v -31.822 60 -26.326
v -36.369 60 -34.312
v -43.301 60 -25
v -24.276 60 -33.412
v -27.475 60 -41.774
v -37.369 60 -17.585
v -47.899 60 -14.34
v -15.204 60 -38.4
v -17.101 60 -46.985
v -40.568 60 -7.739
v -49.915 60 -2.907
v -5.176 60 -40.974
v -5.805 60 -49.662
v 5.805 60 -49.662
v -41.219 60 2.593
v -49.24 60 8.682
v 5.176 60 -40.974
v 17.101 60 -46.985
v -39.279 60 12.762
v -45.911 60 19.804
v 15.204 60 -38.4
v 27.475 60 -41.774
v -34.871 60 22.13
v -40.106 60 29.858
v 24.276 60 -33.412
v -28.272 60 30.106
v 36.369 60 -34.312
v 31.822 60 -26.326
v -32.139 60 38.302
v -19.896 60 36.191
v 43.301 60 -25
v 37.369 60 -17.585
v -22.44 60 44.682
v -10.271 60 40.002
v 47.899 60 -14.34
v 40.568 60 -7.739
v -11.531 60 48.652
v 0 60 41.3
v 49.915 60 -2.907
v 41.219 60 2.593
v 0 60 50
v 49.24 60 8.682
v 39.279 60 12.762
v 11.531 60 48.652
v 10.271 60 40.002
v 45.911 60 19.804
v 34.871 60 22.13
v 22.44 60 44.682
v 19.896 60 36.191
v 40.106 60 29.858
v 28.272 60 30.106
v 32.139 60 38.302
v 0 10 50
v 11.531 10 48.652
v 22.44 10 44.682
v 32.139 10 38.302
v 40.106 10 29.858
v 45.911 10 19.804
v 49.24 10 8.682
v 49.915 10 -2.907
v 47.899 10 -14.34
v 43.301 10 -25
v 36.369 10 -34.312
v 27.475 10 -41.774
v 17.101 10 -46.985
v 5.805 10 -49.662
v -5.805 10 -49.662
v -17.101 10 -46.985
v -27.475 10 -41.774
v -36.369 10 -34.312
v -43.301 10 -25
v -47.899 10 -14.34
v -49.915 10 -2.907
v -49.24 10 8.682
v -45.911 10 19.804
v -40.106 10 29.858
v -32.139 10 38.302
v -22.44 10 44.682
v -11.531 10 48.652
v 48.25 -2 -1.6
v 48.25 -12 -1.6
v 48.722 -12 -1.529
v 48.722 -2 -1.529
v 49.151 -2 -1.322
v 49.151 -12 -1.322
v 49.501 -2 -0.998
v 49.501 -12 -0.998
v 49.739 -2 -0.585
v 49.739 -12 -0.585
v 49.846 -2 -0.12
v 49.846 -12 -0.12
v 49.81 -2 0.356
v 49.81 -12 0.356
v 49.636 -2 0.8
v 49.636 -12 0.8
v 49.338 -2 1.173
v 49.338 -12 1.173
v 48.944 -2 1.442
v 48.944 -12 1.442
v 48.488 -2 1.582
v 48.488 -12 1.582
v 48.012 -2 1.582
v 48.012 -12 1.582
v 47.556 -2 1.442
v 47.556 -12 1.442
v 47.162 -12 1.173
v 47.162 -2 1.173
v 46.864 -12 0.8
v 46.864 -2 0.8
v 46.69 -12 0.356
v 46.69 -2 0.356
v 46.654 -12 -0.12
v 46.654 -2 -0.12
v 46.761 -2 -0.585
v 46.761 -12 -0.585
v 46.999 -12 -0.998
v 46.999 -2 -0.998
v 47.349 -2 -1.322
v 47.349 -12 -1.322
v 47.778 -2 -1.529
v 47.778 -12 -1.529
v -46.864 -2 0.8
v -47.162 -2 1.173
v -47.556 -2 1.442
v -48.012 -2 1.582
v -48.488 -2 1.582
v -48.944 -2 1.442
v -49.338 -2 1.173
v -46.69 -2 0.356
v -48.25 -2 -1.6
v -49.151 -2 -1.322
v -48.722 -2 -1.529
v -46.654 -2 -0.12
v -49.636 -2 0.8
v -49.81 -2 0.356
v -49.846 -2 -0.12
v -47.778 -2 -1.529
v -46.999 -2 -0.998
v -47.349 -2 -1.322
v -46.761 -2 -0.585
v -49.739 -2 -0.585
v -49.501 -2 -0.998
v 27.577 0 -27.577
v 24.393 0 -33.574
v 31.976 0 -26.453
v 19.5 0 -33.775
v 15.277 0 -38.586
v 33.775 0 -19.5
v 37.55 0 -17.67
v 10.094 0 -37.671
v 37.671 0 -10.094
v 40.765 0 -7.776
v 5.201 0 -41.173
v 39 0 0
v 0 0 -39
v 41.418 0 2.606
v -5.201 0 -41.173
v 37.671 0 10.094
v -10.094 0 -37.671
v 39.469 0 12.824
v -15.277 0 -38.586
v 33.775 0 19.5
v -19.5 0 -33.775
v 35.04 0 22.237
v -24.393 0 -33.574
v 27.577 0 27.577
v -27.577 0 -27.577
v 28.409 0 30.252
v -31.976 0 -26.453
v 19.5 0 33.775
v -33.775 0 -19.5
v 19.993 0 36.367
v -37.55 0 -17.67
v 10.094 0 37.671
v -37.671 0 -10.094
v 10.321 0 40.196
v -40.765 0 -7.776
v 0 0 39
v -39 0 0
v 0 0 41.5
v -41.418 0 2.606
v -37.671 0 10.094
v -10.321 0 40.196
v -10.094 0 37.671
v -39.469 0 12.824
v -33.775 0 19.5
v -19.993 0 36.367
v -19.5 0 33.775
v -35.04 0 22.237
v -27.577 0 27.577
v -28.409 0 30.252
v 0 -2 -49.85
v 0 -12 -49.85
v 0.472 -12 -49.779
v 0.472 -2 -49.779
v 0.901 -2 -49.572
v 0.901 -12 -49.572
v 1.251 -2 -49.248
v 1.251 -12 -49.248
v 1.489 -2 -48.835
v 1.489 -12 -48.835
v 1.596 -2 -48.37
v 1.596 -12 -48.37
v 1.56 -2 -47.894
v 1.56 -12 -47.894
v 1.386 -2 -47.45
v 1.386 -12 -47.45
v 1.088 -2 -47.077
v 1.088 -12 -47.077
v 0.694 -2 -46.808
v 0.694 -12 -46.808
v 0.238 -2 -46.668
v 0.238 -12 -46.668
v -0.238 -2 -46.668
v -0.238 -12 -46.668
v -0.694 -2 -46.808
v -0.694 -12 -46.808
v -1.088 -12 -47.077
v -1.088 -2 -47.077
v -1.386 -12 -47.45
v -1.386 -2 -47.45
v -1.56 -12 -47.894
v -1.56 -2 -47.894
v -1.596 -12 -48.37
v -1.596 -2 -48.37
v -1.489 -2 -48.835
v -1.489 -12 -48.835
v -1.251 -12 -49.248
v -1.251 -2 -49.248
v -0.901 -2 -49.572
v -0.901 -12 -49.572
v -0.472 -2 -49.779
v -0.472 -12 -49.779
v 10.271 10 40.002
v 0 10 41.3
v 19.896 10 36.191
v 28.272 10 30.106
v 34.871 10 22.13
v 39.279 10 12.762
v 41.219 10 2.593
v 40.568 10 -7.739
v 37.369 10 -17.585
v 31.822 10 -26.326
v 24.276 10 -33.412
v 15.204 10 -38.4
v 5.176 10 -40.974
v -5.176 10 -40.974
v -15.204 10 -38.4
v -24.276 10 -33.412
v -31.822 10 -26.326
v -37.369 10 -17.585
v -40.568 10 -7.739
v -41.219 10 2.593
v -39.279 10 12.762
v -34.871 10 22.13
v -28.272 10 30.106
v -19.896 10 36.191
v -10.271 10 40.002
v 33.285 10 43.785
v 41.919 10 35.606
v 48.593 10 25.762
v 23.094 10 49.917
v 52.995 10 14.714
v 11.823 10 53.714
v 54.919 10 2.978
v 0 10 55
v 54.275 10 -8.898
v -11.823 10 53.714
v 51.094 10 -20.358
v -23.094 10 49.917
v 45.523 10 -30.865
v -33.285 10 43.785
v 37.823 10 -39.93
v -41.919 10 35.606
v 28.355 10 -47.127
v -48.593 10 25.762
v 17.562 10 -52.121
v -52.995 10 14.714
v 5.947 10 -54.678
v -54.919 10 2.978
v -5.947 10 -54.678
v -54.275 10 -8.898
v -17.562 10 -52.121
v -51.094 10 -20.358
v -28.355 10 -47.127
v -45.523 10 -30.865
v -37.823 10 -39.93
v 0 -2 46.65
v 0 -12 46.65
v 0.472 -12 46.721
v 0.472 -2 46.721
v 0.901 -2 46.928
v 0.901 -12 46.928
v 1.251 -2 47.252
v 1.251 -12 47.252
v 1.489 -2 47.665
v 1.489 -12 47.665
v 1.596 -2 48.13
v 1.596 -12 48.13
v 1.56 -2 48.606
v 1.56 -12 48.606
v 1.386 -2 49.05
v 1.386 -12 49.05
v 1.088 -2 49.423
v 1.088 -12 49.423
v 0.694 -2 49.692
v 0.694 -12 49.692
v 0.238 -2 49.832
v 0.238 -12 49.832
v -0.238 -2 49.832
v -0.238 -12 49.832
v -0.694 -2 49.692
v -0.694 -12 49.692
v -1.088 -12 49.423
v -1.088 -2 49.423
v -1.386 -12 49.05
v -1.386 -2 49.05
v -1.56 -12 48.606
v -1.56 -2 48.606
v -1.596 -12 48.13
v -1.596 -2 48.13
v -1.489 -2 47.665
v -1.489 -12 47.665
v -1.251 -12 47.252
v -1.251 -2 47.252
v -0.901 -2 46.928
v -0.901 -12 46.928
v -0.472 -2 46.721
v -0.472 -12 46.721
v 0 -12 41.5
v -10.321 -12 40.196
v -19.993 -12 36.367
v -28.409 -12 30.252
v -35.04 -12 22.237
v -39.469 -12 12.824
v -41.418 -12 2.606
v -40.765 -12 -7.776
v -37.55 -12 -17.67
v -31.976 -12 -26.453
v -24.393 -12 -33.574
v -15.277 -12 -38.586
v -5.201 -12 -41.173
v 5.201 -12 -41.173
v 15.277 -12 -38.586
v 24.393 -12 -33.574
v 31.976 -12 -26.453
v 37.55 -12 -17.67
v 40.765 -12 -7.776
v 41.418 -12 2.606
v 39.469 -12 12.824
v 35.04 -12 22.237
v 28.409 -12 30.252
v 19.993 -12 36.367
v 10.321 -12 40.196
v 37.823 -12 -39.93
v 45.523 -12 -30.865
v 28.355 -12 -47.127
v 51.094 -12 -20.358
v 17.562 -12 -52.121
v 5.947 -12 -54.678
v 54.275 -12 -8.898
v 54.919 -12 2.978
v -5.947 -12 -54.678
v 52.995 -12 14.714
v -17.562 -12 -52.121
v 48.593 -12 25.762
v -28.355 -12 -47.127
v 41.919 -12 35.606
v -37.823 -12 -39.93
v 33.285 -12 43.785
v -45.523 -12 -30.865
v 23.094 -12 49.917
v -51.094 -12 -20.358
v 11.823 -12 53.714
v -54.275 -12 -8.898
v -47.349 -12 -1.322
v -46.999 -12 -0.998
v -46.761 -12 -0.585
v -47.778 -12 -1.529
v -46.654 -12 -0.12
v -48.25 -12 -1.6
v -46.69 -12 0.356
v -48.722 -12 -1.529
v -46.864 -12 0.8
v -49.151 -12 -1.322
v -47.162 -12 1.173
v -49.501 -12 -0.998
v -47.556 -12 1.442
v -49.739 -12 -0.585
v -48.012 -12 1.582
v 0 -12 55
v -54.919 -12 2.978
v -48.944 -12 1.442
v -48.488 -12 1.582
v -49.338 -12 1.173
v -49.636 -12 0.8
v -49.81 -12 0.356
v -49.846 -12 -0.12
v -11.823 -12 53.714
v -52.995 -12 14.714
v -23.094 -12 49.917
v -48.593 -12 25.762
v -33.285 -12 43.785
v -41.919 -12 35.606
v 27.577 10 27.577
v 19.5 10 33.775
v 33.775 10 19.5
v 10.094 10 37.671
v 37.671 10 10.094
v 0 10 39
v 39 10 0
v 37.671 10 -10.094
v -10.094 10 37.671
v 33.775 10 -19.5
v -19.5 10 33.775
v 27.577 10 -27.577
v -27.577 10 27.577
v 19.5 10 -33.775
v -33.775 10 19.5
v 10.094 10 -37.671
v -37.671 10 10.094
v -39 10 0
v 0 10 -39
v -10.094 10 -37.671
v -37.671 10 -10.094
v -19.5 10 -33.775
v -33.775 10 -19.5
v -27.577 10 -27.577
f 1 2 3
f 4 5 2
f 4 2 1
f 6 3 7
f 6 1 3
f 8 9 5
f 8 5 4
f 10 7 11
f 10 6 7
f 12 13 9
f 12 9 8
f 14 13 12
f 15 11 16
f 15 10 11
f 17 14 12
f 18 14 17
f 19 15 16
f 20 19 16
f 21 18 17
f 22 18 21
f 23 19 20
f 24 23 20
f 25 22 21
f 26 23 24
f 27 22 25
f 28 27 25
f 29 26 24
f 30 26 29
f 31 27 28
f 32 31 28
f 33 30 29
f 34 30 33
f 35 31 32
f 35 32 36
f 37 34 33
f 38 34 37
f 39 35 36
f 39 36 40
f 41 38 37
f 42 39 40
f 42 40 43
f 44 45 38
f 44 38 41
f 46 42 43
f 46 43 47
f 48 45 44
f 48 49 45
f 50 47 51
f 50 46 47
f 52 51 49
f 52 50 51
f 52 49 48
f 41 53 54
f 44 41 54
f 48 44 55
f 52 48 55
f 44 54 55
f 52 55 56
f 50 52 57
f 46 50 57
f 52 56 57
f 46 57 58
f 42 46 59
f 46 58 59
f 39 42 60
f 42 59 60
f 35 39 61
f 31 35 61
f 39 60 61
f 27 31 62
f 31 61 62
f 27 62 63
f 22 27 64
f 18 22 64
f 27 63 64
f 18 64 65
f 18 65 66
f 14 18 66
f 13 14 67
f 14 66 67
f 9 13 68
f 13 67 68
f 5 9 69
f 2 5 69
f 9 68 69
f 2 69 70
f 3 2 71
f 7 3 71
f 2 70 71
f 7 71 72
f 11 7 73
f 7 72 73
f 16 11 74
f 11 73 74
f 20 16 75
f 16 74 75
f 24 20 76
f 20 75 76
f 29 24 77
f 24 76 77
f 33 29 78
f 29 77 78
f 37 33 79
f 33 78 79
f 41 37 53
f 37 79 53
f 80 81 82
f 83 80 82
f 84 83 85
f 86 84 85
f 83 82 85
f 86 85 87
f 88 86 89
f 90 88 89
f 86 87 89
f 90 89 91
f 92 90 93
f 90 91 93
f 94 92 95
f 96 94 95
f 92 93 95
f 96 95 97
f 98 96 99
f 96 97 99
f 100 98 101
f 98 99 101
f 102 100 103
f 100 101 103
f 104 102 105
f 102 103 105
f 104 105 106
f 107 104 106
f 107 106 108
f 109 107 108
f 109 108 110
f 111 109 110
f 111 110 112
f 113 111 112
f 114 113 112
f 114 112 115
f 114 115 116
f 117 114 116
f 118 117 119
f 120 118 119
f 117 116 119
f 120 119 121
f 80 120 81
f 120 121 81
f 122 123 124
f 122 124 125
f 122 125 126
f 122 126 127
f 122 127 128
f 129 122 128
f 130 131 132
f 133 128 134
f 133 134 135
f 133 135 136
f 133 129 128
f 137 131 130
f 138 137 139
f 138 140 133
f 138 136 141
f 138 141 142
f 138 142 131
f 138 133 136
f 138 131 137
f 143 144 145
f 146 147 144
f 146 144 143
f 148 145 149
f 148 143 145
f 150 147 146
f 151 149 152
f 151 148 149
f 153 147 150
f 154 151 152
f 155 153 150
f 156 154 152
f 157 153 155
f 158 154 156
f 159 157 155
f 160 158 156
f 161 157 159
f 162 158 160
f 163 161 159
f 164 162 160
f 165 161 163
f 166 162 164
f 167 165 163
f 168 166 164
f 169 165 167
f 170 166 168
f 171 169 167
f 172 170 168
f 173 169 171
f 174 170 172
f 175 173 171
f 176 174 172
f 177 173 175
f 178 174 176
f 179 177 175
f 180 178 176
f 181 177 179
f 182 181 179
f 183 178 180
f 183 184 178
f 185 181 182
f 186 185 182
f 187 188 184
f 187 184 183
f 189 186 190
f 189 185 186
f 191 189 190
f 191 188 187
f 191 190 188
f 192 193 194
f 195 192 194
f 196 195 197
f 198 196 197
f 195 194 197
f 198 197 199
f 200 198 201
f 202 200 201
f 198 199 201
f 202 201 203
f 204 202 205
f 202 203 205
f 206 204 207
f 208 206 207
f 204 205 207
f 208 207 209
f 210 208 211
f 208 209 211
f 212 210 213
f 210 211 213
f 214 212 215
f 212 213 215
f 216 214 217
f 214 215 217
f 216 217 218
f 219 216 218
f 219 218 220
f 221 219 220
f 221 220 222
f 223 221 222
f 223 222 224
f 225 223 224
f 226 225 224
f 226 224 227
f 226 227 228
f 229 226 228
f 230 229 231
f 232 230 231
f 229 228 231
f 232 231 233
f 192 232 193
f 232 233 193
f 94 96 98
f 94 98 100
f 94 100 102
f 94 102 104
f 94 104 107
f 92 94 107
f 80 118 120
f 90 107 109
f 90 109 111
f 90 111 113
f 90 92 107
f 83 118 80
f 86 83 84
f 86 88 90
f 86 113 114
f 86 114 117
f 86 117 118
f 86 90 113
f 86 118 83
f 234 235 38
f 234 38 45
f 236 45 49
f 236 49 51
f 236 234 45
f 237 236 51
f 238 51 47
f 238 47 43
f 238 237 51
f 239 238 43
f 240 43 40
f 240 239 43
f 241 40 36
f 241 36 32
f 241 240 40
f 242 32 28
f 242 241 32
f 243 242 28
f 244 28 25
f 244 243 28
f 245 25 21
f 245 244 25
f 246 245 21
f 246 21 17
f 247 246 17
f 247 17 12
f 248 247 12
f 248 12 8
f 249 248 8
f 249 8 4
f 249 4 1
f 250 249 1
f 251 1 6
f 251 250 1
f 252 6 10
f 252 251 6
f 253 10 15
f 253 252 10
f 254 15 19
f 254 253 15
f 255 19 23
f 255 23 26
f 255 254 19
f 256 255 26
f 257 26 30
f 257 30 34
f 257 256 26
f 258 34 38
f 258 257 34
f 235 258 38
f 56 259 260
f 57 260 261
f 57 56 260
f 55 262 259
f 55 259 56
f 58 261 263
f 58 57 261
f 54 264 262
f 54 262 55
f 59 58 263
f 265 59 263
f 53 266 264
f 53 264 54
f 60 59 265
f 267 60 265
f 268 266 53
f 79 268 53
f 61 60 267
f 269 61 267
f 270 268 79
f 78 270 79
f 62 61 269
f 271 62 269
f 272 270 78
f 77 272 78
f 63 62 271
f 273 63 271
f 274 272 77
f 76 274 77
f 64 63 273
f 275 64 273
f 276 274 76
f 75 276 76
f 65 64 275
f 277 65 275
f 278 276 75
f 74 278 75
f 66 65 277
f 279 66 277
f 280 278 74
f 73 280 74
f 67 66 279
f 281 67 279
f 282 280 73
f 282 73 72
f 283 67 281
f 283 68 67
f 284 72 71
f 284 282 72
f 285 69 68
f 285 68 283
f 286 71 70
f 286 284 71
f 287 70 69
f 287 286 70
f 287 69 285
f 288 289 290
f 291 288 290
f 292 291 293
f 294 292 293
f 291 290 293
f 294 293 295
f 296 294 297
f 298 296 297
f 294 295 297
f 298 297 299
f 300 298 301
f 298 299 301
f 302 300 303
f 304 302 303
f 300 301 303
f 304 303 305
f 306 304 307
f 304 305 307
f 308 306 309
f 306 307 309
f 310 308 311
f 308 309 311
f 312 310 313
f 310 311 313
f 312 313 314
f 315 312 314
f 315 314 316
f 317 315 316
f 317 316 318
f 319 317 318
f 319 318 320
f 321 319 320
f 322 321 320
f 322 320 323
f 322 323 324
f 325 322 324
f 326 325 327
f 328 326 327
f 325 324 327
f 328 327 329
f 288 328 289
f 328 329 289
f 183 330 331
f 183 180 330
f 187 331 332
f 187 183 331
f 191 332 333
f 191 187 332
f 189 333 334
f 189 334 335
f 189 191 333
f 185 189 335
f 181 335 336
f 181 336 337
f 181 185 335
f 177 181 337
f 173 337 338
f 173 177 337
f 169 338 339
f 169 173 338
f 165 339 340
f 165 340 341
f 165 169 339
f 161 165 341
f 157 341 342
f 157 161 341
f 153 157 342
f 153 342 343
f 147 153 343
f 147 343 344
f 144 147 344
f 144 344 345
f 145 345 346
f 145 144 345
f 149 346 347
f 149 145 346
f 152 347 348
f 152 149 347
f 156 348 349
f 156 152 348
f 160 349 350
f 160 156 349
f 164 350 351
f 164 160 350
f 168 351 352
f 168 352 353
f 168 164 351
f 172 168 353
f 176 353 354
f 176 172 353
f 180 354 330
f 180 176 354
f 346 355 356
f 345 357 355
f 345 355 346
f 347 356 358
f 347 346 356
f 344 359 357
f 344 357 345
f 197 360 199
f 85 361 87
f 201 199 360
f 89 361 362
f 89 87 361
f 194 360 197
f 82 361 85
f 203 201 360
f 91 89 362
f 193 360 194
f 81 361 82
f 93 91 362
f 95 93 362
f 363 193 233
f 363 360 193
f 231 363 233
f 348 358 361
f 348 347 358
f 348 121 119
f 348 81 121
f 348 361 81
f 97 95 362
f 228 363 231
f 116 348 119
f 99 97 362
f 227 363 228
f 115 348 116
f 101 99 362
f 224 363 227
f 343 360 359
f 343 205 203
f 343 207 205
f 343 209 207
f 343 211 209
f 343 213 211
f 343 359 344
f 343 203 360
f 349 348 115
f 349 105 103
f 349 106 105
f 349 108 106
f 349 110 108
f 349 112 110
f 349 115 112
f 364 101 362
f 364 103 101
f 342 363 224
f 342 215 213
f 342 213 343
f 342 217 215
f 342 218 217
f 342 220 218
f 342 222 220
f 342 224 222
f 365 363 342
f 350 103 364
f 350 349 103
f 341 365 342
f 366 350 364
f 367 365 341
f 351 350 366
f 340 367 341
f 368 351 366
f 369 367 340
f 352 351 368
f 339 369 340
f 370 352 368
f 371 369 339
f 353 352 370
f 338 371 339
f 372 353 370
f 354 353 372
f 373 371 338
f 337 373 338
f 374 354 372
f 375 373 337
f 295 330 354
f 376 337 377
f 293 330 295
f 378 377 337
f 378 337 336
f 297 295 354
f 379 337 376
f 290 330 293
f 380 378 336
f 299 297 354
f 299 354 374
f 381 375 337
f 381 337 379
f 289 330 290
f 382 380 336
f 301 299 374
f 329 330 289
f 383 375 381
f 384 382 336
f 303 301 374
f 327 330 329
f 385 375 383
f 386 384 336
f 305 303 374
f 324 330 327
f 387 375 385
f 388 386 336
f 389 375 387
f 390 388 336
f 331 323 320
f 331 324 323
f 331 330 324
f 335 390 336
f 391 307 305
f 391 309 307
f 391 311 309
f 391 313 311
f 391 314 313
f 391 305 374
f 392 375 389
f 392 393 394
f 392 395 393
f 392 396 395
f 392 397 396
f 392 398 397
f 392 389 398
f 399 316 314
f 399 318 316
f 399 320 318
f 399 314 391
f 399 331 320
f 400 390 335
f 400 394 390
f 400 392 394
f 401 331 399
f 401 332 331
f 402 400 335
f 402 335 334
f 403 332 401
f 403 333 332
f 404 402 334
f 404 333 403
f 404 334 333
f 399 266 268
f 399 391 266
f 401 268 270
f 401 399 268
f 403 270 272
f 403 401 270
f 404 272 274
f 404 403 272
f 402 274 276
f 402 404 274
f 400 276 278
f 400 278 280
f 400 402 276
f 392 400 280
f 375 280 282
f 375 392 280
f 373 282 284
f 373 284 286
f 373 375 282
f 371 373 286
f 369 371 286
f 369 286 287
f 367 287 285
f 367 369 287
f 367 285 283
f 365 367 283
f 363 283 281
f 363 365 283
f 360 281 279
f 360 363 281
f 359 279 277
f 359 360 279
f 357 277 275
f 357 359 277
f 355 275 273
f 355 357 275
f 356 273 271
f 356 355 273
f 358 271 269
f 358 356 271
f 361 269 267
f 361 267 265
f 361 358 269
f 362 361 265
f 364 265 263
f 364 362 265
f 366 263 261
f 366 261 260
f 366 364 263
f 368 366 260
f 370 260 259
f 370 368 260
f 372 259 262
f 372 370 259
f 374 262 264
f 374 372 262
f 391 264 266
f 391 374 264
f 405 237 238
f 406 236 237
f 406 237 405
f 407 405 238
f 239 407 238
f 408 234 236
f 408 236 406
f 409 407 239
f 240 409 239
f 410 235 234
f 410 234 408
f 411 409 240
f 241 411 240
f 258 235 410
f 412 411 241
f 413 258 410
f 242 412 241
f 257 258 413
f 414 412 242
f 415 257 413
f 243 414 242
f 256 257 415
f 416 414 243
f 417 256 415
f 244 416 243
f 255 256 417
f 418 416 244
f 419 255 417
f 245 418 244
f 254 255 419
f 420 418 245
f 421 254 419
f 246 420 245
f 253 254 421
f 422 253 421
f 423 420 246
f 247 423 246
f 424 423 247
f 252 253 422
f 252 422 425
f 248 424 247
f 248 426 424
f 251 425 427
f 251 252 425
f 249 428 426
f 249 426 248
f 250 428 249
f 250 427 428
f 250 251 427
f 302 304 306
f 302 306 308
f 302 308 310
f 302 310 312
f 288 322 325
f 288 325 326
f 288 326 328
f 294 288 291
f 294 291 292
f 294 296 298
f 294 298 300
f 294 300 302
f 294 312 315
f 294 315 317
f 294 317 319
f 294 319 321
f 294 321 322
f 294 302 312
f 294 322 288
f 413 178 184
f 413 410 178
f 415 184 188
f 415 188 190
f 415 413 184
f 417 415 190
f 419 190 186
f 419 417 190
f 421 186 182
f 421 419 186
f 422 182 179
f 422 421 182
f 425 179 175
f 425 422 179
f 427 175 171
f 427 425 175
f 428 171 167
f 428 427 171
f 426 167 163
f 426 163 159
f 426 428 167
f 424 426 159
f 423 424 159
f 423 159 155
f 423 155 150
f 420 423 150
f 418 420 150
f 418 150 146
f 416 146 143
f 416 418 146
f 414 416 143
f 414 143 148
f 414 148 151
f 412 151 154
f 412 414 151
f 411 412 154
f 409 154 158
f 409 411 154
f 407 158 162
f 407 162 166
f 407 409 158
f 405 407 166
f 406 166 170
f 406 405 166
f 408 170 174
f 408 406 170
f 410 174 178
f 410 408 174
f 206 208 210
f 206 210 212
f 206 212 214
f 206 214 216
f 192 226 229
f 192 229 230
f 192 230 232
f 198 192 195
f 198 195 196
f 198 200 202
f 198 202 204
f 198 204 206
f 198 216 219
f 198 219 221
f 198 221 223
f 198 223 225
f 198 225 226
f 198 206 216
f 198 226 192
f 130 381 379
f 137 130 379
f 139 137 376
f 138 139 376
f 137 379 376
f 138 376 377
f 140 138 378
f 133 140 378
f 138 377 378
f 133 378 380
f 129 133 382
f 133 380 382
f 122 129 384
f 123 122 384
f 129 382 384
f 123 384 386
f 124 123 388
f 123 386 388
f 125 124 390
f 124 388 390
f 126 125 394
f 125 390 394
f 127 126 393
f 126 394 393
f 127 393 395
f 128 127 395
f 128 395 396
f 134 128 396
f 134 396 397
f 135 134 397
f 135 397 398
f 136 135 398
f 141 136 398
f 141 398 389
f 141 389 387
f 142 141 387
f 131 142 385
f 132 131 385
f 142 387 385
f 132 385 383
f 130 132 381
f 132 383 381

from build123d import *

# Parameters (mm, degrees)
SKETCH4_R           = 50
SKETCH4_R_2         = 41.3
BOSS_EXTRUDE1_DEPTH = 50
SKETCH3_R           = 1.6
CUT_EXTRUDE1_DEPTH  = 10


with BuildPart() as part:
    # Sketch1 → Revolve1 (revolve)
    with BuildSketch(Plane.XY, mode=Mode.PRIVATE) as revolve1_sk:
        Polygon((39, 0), (39, 10), (55, 10), (55, -12), (41.5, -12), (41.5, 0), align=None)
    revolve(revolve1_sk.sketch.rotate(Axis((0, 83.520836207, 0), (0, -1, 0)), 90), axis=Axis((0, 83.520836207, 0), (0, -1, 0)))

    # Sketch4 → Boss-Extrude1 (add)
    with BuildSketch(Plane(origin=(0, 10, 0), x_dir=(1, 0, 0), z_dir=(0, 1, 0))):
        with Locations(Location((0, 0, 0), (0, 0, 270))):
            Circle(SKETCH4_R)
        with Locations(Location((0, 0, 0), (0, 0, 270))):
            Circle(SKETCH4_R_2, mode=Mode.SUBTRACT)
    extrude(amount=BOSS_EXTRUDE1_DEPTH)

    # Sketch3 → Cut-Extrude1 (cut)
    with BuildSketch(Plane.XZ.offset(12)):
        with Locations(Location((0, 48.25, 0), (0, 0, 270))):
            Circle(SKETCH3_R)
        with Locations(Location((48.25, 0, 0), (0, 0, 270))):
            Circle(SKETCH3_R)
        with Locations(Location((0, -48.25, 0), (0, 0, 270))):
            Circle(SKETCH3_R)
        with Locations(Location((-48.25, 0, 0), (0, 0, 270))):
            Circle(SKETCH3_R)
    extrude(amount=-CUT_EXTRUDE1_DEPTH, mode=Mode.SUBTRACT)


solid = part.part
